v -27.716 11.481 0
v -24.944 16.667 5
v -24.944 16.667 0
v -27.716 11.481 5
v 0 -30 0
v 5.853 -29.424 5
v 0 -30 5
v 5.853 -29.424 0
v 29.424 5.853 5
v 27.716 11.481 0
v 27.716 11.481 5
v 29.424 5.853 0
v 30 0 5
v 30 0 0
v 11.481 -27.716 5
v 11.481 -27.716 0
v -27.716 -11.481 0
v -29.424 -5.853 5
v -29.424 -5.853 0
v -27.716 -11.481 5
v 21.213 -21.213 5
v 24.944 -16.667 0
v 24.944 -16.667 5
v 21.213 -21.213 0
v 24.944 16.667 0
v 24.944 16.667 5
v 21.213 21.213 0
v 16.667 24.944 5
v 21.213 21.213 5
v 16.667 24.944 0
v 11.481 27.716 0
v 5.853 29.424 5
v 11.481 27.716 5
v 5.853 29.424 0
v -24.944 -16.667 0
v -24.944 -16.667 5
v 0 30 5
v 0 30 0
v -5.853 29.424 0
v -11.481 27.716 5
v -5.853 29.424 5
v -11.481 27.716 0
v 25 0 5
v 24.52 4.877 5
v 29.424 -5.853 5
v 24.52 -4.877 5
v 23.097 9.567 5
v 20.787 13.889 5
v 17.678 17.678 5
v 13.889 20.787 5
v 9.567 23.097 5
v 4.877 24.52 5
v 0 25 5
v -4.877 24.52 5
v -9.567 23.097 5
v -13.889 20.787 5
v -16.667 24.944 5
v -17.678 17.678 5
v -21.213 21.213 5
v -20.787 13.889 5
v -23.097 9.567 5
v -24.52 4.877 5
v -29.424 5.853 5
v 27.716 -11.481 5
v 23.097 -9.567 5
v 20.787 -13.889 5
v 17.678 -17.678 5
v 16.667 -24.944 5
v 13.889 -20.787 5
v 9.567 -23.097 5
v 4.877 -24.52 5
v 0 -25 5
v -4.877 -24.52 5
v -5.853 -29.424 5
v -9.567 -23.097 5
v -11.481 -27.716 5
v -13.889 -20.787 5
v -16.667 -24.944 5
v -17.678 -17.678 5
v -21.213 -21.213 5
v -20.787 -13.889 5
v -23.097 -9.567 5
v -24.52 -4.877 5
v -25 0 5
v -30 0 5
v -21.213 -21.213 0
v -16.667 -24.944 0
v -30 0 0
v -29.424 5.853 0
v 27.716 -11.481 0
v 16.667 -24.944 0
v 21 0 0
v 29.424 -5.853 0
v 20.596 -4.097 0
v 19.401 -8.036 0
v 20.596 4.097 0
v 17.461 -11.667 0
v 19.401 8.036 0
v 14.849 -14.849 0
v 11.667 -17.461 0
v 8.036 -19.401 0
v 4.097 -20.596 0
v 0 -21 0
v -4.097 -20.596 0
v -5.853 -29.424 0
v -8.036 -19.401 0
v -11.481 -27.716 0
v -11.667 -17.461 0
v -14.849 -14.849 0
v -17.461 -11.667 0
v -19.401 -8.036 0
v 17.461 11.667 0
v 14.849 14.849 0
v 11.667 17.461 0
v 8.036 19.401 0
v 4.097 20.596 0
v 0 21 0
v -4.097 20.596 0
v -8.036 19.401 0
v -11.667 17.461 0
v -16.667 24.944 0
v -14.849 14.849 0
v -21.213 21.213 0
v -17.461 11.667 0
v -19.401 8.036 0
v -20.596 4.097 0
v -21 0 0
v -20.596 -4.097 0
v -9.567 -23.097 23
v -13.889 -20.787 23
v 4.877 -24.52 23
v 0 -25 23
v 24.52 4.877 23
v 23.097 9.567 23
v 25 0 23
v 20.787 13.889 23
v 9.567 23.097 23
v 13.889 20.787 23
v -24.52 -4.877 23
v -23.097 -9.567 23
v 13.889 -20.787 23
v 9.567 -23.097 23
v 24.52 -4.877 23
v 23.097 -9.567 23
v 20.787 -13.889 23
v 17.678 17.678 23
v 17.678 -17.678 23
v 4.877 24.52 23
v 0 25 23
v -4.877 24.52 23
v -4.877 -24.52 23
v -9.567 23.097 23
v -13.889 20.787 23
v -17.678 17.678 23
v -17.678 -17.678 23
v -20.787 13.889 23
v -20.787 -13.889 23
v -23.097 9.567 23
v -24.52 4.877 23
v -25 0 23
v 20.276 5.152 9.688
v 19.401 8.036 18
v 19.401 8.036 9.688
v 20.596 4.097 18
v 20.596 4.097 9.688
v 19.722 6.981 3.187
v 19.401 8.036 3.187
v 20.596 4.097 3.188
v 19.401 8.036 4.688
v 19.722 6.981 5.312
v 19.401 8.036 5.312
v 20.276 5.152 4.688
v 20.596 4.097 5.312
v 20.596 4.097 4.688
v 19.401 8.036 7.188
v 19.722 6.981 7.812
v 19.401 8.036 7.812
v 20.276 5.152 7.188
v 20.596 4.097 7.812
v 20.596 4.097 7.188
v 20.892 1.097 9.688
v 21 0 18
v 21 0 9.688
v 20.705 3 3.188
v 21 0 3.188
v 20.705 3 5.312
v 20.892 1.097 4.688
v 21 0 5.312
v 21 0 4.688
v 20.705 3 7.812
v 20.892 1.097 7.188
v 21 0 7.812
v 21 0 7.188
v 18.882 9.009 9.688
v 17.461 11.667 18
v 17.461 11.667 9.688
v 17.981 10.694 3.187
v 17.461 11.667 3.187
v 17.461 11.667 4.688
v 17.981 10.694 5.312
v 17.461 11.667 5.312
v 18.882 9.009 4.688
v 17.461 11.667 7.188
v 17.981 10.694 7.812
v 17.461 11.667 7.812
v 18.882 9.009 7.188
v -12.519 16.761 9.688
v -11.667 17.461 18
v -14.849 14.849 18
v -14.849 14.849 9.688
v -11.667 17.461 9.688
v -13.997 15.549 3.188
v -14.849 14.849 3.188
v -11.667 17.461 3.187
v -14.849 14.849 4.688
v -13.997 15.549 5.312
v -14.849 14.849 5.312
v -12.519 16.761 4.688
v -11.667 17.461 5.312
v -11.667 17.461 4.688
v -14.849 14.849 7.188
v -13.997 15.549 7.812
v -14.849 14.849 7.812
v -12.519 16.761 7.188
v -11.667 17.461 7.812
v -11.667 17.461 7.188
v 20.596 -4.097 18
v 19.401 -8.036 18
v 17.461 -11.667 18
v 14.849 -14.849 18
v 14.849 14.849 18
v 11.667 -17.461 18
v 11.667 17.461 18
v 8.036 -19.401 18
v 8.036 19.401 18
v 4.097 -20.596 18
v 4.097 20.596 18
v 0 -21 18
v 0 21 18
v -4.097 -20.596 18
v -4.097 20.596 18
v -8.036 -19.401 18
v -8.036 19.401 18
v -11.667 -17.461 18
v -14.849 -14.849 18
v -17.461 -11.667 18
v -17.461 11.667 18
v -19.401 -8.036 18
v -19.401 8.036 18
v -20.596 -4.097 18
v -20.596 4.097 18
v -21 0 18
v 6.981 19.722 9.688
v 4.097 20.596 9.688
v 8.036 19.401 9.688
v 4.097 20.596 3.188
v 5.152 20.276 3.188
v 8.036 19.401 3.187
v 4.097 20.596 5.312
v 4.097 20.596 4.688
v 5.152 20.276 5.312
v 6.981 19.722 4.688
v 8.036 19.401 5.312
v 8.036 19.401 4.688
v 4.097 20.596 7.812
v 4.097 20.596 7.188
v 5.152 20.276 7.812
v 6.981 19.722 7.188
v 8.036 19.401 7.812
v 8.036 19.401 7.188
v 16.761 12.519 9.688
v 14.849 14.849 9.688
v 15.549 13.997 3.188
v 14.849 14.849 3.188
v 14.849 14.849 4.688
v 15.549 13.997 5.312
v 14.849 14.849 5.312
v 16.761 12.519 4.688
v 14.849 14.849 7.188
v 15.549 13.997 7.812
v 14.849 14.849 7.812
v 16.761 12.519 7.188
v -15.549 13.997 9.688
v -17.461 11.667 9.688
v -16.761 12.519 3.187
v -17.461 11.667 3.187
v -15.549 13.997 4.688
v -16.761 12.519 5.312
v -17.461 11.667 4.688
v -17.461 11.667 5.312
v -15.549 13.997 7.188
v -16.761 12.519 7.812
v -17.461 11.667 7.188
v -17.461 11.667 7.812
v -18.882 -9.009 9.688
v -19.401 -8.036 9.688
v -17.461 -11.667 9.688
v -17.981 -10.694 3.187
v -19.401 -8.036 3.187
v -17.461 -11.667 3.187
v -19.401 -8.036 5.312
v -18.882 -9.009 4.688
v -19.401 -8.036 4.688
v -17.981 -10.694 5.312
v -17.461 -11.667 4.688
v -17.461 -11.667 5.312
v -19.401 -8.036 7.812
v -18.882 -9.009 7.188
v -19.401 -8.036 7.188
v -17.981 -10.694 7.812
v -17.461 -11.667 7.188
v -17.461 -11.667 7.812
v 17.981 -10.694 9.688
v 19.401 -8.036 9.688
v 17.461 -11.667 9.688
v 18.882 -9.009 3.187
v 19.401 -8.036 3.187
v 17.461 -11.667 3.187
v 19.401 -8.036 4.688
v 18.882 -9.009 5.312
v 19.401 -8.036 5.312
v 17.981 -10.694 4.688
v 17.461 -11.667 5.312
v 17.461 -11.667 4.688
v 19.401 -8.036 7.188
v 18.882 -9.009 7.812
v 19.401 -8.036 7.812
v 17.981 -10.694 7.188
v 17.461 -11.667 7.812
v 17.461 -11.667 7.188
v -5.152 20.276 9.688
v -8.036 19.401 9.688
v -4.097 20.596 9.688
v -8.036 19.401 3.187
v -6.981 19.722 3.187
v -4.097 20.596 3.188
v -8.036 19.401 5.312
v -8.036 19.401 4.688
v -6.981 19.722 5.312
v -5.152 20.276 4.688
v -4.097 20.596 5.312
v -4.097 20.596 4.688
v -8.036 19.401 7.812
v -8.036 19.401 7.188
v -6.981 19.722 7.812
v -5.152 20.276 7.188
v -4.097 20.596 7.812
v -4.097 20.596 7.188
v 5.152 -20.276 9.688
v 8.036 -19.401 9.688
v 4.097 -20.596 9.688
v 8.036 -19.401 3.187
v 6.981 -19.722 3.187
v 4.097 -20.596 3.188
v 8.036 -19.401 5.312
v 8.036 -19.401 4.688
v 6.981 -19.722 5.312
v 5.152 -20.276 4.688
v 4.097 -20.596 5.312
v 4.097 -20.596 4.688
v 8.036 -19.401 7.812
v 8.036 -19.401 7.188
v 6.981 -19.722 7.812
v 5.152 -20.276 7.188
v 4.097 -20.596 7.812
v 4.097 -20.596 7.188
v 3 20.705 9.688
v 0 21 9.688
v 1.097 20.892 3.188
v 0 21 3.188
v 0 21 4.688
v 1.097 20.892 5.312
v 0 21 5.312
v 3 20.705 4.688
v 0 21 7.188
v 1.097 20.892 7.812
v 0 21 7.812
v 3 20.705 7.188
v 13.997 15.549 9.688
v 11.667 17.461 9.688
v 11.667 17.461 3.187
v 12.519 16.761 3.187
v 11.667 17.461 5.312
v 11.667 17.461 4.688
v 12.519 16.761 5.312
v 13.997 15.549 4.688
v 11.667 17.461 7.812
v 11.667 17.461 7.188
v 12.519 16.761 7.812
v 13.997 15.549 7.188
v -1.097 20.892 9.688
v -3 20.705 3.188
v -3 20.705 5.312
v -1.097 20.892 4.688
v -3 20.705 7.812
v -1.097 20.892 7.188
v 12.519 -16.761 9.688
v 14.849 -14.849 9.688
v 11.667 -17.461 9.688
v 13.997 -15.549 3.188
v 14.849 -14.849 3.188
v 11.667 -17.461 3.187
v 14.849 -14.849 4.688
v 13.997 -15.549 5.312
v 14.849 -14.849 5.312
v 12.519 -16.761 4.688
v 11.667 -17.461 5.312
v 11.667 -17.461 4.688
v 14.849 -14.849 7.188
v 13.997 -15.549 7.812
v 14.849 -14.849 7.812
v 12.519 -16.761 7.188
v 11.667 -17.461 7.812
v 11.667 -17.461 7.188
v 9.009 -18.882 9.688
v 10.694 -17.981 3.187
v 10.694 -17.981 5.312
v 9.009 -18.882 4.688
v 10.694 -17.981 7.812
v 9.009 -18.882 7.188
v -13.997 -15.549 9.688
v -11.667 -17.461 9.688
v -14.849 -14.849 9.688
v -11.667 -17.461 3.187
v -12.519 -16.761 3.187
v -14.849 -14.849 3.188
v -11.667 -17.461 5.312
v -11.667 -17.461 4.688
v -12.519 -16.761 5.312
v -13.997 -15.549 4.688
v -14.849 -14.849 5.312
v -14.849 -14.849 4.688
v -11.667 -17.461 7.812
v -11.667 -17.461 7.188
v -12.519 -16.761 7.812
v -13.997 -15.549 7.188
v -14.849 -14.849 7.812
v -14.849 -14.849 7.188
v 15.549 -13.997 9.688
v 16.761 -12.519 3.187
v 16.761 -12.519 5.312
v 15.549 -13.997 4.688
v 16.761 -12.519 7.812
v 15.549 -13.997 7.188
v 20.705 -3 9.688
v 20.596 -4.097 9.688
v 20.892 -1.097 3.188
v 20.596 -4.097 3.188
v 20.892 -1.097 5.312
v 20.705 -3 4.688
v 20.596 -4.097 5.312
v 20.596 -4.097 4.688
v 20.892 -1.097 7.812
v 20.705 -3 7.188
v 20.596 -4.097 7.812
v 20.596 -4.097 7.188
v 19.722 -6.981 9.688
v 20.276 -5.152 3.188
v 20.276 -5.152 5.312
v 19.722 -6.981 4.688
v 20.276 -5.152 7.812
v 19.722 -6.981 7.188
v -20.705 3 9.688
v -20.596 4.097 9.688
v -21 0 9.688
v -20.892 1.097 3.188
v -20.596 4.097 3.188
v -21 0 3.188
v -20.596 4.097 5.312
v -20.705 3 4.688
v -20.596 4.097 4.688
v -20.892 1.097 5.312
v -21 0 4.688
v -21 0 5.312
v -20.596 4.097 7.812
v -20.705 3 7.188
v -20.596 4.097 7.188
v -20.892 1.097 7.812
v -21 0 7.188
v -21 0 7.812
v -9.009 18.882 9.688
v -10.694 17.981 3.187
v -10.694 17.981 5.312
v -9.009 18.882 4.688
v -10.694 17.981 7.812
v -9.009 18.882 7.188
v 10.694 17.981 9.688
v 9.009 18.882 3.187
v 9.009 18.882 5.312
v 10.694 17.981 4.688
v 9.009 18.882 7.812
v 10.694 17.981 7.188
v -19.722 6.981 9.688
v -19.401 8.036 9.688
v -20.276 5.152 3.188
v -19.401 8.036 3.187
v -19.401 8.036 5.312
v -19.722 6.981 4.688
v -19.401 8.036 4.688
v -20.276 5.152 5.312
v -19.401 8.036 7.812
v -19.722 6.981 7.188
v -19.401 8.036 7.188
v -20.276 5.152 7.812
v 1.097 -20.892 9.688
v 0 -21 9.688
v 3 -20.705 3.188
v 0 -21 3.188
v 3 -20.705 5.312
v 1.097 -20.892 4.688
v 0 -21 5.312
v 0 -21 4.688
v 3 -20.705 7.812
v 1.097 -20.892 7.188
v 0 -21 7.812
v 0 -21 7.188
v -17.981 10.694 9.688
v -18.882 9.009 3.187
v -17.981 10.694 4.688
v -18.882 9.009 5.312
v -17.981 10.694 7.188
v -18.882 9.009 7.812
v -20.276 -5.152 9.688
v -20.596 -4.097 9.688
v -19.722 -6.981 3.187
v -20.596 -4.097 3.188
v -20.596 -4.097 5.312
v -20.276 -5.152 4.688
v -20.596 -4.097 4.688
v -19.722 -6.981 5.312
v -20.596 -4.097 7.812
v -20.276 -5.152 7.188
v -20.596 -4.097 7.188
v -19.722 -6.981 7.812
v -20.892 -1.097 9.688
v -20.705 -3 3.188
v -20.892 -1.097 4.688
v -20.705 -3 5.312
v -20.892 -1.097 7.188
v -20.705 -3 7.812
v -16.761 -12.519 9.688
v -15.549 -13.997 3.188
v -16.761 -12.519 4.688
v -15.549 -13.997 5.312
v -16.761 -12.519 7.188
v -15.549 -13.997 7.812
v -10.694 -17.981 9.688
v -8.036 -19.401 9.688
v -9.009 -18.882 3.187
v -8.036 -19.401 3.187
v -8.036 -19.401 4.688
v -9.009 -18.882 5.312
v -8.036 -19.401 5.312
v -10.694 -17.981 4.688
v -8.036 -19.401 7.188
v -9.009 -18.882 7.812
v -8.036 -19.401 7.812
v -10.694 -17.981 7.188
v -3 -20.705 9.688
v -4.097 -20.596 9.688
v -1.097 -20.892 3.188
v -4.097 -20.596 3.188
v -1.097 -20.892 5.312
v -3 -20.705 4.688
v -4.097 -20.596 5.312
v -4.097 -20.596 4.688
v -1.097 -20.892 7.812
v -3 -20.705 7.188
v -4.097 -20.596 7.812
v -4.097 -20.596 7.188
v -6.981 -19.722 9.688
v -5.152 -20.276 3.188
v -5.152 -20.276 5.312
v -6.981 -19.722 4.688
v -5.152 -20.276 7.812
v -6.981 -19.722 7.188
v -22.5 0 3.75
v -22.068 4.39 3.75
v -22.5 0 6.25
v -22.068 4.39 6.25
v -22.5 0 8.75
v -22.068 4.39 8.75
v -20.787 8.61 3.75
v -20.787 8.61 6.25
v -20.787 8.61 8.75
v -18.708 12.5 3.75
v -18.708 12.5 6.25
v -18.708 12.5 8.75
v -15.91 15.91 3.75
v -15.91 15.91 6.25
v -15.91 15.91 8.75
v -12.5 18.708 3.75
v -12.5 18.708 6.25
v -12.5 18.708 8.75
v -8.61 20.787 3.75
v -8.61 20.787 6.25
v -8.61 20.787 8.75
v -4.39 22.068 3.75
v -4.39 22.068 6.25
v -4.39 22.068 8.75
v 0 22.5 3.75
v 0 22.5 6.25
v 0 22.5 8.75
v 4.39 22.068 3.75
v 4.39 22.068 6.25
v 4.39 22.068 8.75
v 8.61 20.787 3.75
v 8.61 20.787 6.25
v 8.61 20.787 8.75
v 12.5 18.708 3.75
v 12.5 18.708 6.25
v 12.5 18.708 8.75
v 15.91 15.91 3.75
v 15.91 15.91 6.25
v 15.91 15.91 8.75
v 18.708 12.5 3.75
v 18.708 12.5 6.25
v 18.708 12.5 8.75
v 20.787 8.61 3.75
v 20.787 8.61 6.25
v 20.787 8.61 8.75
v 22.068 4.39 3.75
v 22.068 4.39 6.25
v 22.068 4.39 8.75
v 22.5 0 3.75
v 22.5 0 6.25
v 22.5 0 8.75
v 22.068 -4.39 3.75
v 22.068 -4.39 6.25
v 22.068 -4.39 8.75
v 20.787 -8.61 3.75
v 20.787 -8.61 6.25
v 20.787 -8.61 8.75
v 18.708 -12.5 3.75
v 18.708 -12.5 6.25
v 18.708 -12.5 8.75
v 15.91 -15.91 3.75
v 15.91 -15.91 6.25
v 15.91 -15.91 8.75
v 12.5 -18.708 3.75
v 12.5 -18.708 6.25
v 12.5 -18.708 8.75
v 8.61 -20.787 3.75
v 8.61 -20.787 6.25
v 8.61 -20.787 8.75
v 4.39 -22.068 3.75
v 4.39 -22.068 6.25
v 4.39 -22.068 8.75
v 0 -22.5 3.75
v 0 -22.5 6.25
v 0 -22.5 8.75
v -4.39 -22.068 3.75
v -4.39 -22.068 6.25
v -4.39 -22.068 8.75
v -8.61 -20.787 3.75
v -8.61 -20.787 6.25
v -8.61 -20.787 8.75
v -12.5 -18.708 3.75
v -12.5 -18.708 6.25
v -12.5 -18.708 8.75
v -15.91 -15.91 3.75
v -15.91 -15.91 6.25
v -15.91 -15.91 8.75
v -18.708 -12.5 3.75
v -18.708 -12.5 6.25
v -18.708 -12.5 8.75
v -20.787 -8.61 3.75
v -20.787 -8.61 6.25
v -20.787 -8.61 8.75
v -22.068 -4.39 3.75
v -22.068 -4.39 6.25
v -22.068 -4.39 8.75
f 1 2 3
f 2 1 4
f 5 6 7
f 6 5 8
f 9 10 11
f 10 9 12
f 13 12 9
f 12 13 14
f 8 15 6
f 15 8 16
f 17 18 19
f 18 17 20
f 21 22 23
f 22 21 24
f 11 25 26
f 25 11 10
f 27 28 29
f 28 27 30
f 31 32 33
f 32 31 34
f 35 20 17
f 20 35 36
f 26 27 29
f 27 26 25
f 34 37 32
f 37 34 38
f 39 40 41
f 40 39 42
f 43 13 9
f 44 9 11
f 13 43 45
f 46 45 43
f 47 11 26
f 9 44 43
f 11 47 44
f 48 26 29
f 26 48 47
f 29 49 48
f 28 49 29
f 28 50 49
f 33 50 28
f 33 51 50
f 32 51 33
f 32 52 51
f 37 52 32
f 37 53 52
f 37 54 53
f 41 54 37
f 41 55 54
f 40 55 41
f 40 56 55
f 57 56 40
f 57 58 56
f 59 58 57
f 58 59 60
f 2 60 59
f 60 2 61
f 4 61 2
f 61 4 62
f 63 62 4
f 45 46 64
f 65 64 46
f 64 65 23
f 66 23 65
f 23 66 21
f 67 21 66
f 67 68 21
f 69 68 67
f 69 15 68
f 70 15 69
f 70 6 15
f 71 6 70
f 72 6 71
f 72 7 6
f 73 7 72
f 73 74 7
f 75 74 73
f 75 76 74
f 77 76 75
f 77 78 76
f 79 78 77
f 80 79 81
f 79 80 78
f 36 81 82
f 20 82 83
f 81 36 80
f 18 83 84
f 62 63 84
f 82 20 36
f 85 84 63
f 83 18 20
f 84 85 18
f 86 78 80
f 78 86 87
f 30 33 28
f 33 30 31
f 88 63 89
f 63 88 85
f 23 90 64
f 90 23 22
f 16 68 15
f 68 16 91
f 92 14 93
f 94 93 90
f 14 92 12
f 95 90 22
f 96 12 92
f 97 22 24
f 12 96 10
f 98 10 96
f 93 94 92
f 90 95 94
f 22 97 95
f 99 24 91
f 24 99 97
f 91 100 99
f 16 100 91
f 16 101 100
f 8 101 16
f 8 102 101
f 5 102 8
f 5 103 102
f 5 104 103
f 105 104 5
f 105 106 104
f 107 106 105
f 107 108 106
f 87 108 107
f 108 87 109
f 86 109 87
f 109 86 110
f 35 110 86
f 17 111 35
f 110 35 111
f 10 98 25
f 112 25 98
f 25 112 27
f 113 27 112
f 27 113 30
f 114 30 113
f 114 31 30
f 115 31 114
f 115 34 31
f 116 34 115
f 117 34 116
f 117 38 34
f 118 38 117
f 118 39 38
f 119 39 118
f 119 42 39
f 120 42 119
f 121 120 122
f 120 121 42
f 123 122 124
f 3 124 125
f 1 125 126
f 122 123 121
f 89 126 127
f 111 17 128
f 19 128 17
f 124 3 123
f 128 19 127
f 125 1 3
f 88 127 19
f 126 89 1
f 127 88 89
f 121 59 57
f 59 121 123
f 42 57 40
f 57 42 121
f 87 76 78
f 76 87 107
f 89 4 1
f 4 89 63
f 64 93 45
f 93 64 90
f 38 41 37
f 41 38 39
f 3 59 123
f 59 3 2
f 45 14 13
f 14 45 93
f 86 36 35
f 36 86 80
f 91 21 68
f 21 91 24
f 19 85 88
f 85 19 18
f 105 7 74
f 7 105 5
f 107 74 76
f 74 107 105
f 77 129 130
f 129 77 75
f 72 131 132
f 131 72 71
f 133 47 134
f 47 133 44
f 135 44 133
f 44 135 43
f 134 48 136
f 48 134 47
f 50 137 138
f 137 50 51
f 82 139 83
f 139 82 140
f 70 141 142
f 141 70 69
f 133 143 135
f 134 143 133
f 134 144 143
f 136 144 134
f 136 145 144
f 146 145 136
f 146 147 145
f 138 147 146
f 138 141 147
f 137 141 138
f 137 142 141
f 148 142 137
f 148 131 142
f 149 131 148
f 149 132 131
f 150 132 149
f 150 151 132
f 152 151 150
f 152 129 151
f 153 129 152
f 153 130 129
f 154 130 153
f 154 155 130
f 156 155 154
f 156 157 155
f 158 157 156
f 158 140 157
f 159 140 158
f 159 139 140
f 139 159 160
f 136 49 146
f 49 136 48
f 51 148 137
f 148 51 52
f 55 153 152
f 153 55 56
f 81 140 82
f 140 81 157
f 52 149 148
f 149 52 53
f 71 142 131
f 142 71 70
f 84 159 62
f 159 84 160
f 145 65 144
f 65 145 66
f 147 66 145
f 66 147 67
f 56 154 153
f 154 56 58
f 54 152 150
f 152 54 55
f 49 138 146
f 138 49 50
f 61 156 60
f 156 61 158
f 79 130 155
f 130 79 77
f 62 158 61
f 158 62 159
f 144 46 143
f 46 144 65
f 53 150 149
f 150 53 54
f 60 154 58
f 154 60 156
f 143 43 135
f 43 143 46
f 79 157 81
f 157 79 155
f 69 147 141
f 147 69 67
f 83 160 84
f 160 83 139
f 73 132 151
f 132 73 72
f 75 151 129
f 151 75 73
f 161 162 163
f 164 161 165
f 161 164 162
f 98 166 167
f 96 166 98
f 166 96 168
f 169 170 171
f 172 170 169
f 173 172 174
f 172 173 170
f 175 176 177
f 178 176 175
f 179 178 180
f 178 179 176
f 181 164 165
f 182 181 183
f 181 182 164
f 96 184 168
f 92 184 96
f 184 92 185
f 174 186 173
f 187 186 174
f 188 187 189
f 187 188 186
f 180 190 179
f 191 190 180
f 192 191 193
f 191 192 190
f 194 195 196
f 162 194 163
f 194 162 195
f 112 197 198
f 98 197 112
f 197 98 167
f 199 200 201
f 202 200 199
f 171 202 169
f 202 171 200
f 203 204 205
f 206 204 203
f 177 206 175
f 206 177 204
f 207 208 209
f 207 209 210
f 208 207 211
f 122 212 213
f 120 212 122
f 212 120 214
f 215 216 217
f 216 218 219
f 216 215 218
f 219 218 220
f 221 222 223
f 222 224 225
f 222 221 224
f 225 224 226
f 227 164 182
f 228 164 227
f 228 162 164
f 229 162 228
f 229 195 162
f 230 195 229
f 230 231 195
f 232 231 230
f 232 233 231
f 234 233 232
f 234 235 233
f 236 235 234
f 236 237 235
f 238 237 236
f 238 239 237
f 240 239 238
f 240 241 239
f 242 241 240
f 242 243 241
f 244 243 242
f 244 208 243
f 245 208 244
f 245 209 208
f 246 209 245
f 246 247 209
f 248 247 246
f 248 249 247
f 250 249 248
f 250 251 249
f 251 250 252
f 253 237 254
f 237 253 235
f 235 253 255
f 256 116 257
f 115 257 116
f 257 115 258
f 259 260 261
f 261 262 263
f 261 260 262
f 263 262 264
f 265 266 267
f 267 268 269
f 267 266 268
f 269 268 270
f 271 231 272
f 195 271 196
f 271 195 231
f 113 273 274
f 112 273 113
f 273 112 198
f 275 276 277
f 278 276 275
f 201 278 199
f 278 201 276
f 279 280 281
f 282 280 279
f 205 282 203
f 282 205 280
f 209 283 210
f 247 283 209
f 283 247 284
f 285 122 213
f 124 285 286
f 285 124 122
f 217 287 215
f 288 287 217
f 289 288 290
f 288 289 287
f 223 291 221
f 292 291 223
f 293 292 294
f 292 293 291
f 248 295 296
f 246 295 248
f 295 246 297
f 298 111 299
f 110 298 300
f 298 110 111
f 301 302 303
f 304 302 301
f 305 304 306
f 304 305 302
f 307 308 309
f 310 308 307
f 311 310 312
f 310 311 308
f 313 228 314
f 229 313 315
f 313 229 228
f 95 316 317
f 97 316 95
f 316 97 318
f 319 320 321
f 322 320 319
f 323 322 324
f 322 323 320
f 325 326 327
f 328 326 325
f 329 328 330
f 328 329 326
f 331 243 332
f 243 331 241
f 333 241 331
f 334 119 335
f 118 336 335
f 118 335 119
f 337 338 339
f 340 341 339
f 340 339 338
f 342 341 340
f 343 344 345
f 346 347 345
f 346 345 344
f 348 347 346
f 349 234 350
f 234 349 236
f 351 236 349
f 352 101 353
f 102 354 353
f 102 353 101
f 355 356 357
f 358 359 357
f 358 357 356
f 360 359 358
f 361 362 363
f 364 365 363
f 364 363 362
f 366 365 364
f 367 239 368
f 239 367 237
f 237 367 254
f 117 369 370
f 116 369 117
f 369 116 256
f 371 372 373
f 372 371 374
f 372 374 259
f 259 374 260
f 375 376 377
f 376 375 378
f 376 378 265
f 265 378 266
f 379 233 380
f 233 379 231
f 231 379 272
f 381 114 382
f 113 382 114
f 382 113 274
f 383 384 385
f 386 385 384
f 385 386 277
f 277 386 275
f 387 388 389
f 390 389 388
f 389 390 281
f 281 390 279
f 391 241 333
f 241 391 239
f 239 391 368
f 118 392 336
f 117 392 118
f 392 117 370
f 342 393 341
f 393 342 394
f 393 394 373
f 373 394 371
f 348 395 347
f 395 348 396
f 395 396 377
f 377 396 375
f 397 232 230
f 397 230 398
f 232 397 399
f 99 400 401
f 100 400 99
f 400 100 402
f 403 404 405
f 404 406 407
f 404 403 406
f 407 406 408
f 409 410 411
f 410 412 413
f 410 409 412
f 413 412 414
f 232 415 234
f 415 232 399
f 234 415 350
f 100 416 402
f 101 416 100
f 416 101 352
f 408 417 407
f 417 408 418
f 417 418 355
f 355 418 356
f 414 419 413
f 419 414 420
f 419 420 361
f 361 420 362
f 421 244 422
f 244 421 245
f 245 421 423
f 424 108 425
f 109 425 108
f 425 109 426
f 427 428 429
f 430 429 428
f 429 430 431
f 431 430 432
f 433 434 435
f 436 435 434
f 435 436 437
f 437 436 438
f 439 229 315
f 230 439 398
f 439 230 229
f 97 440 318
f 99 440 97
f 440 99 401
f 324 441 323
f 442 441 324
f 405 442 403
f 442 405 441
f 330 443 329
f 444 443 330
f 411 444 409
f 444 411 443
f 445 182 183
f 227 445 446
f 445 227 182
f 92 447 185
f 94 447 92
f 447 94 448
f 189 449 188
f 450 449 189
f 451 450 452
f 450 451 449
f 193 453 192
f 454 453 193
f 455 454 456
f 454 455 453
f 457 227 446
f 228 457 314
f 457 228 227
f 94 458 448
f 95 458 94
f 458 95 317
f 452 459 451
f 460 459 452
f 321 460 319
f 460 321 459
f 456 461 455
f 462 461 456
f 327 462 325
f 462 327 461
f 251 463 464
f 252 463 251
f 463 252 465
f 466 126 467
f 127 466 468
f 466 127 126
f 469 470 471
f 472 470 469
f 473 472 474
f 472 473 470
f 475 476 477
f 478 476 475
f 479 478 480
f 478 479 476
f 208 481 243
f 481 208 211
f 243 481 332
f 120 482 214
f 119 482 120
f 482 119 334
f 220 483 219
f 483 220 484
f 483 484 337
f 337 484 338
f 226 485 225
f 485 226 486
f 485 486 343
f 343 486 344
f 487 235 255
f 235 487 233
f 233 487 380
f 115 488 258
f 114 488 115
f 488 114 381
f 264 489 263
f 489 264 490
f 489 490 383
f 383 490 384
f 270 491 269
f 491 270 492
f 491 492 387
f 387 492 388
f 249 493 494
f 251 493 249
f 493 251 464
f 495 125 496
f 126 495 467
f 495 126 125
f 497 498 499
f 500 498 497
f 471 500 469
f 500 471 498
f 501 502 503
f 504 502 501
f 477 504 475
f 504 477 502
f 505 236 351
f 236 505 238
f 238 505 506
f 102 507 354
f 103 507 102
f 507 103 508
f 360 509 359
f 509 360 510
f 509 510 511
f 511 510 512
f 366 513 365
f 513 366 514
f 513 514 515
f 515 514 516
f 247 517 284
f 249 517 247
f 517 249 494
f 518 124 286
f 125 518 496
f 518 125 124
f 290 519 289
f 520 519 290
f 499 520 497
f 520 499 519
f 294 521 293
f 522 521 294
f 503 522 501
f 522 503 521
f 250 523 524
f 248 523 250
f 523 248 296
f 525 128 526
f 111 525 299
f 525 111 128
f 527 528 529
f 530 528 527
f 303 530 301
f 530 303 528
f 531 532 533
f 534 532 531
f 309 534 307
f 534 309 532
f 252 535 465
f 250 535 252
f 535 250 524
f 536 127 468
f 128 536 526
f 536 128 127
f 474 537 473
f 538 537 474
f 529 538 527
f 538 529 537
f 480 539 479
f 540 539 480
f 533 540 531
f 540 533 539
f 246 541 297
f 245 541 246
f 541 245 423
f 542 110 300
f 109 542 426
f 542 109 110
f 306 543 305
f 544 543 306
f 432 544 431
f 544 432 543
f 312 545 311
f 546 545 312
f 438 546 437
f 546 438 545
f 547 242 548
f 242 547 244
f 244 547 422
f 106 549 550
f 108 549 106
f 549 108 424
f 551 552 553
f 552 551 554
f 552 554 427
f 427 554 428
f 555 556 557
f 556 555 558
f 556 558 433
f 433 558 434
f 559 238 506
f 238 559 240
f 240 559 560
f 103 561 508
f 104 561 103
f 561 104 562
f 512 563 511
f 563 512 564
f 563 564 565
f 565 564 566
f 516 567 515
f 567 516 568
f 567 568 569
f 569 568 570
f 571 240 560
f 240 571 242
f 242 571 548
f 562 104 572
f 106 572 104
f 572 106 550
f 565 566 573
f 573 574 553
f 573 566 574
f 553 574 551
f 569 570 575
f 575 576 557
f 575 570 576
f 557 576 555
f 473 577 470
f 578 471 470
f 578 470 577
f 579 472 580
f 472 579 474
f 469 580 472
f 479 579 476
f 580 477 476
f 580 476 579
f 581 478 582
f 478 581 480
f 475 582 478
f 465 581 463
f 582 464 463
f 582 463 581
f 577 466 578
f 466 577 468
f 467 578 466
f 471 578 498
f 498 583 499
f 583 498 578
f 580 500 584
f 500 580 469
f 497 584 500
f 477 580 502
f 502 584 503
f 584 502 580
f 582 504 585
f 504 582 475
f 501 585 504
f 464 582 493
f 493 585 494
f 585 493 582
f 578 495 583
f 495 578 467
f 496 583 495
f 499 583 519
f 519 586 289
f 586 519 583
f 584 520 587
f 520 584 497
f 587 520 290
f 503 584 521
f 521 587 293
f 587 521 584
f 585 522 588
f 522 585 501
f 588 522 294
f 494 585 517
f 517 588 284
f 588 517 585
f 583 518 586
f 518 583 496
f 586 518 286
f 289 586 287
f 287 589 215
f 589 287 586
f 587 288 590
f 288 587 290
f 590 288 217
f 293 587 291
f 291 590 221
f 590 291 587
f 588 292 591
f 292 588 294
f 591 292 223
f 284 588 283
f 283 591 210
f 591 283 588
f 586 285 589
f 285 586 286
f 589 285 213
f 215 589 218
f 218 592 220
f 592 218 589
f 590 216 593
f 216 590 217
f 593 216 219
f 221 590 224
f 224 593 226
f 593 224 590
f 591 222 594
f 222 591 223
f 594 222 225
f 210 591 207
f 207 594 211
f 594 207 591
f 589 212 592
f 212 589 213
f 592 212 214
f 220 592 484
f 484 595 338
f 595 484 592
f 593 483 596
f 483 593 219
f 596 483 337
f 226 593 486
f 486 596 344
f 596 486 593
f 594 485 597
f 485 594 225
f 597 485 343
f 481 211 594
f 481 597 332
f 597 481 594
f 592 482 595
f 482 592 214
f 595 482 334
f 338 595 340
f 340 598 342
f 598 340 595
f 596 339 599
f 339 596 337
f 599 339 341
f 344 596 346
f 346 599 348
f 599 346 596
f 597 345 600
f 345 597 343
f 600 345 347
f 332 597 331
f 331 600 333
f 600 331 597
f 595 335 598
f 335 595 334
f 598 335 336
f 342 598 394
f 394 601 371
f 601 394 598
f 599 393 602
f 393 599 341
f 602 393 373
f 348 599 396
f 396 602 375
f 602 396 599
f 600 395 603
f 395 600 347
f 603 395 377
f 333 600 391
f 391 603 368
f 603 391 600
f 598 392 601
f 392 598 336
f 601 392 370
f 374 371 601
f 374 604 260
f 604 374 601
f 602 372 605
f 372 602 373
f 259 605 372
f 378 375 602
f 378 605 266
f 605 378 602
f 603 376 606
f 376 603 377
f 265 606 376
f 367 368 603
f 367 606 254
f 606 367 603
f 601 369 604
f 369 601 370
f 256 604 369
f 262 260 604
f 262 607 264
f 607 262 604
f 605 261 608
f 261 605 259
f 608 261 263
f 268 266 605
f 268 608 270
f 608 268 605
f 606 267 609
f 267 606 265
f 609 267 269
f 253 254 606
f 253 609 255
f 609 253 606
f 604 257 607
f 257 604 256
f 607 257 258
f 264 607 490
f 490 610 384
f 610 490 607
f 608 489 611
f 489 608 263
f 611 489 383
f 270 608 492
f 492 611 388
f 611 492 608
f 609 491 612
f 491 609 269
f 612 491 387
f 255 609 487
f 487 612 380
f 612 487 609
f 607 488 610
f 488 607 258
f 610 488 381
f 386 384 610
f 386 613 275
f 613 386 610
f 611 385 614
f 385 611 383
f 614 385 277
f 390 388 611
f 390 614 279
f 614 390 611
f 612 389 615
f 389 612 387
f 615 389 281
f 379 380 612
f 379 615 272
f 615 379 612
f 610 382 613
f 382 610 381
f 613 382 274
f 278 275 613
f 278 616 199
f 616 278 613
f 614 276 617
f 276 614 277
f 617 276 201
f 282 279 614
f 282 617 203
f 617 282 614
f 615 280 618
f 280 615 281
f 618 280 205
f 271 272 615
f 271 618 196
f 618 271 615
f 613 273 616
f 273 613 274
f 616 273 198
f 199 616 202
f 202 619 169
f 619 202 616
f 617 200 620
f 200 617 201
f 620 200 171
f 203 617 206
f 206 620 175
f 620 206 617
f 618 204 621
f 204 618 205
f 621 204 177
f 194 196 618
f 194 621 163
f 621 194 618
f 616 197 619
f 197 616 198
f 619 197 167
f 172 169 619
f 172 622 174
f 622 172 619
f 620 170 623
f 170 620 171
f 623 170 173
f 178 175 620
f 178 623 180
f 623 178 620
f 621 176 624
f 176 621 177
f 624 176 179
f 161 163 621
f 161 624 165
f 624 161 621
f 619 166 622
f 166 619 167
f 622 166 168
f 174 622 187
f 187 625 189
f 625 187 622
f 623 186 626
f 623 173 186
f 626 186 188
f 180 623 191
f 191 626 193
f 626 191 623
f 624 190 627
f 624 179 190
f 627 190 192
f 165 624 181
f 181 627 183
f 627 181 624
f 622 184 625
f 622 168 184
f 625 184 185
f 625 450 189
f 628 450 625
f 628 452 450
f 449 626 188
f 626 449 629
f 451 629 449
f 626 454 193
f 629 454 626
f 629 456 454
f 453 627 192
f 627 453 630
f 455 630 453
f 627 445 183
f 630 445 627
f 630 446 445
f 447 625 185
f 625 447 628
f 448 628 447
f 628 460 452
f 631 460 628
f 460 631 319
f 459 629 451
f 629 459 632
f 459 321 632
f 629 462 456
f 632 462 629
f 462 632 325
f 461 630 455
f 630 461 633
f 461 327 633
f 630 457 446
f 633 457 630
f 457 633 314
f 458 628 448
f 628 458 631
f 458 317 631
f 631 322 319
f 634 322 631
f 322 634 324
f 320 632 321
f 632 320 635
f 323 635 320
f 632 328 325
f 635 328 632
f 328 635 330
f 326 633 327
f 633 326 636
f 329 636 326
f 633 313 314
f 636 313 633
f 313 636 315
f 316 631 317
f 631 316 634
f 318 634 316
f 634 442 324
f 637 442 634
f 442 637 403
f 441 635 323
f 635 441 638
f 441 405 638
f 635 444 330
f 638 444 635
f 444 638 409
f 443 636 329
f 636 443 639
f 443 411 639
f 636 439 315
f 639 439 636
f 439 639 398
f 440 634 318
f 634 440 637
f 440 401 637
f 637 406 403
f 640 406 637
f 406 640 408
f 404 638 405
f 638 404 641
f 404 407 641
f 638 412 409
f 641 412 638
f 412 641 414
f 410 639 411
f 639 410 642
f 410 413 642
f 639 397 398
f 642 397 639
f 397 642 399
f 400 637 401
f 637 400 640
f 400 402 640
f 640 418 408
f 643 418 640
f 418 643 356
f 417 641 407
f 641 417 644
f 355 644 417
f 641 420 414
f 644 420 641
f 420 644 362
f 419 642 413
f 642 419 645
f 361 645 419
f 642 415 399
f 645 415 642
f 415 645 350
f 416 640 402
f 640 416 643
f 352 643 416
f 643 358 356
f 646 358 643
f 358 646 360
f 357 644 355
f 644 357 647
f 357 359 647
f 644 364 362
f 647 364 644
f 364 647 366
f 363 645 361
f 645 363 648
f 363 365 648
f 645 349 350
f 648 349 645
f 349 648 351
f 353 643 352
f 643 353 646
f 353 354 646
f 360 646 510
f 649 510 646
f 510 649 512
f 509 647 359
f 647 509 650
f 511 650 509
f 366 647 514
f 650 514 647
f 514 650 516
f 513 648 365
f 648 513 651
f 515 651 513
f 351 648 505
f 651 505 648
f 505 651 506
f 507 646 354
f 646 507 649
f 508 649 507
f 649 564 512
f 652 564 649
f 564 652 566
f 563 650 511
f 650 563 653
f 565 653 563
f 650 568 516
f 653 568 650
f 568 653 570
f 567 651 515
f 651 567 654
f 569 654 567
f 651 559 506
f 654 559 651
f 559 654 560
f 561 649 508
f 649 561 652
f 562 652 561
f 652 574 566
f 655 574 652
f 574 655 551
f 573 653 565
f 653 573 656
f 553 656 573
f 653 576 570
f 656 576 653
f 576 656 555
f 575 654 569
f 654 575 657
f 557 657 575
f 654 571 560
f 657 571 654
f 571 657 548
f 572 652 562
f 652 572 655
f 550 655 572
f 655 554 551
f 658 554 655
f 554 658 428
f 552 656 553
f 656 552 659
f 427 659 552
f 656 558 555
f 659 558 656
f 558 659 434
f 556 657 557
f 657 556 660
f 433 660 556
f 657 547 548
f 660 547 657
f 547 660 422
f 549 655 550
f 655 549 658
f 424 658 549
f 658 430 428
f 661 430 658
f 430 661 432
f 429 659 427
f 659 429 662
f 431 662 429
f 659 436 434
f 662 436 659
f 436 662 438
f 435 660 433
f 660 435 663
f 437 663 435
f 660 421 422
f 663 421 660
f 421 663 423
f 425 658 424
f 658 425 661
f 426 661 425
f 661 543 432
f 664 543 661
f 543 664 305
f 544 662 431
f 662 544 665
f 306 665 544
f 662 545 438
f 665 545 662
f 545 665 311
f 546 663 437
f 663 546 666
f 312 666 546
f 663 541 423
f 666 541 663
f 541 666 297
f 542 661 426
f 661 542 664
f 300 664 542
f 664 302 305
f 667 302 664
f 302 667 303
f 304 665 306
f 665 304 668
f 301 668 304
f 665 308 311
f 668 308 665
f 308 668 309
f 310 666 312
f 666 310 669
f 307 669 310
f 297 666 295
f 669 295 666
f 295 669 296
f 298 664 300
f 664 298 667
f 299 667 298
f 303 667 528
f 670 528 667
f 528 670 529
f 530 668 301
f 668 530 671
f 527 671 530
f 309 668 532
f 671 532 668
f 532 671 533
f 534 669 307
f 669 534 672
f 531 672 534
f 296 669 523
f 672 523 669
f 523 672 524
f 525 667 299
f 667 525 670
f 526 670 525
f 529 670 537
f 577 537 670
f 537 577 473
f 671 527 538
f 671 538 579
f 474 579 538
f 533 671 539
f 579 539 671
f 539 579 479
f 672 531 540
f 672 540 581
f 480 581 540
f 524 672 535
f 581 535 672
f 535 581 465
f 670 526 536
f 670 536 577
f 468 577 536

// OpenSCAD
$fn = 32;

// ----------------------------------------------------------------------
// Threaded cap: 50 mm body, 18 mm tall, 42 mm threaded bore
// ----------------------------------------------------------------------

// --- parameters (mm) ---
outer_d = 50;             // cap outside diameter
body_h = 18;              // cap height
top_t = 5;                // closed top thickness
bore_d = 42;              // bore core diameter
pitch = 2.5;              // thread pitch
thread_d = 1.5;           // thread depth
thread_z = 3;             // thread start above the rim
thread_h = 7;             // threaded height
flange_d = 60;            // flange diameter
flange_t = 5;             // flange thickness

difference() {
  union() {
    cylinder(h = 5, d = flange_d);
    translate([0, 0, 4.5]) cylinder(h = 18.5, d = outer_d);
  }
  /* threaded bore, closed at the top */
  translate([0, 0, -2.5]) cylinder(h = 20.5, d = bore_d);
  translate([0, 0, 3]) rotate_extrude() polygon([[20, 0], [20, 7], [20.5, 7], [22.5, 5.75], [20.5, 4.5], [22.5, 3.25], [20.5, 2], [22.5, 0.75], [20.5, 0], [20, 0]]);
}
